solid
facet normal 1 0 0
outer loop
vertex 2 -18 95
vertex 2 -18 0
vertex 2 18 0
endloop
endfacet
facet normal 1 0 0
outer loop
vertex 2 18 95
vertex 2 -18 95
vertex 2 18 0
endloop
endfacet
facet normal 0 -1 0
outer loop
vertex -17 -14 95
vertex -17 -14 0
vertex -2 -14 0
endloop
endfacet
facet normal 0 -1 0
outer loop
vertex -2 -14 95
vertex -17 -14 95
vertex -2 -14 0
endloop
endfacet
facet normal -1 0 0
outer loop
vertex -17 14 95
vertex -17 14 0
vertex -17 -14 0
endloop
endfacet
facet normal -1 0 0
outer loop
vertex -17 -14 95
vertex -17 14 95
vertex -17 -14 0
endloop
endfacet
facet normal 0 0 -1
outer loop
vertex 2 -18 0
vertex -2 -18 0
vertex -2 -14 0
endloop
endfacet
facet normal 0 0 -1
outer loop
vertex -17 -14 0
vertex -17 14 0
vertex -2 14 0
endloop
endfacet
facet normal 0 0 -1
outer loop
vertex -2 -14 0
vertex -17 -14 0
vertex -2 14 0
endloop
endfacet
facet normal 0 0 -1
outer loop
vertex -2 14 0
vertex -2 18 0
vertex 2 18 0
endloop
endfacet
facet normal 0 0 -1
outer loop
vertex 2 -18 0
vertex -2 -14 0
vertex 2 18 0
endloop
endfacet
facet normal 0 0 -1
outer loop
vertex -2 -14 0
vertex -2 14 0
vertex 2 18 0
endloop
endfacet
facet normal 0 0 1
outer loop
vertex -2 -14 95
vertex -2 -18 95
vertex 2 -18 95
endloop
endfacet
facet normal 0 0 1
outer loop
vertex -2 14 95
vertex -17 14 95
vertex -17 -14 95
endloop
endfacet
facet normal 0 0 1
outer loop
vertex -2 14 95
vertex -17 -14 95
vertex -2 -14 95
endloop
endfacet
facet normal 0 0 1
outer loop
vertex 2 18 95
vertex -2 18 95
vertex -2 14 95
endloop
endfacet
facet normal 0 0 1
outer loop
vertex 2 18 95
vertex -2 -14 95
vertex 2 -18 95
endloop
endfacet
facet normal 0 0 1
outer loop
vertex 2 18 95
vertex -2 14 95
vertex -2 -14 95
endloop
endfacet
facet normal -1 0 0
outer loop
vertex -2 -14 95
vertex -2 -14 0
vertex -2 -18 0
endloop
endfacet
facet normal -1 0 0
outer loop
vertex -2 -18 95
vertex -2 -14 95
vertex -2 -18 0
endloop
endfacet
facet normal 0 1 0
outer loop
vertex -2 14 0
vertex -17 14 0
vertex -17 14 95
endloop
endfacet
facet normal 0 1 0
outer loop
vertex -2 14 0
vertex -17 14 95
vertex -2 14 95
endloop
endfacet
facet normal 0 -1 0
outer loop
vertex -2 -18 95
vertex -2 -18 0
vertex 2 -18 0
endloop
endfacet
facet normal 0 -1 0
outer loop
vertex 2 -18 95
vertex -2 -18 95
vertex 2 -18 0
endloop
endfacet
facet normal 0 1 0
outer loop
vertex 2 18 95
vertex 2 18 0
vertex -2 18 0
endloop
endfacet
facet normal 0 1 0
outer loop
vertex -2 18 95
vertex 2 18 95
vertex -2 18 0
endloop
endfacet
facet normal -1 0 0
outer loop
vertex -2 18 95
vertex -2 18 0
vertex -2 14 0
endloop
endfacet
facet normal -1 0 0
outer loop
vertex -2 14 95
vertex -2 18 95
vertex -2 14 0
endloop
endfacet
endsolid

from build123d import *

# Parameters (mm, degrees)
F0_W     = 15
F0_H     = 5
F0_H_2   = 18
F1_DEPTH = 95


with BuildPart() as f1:
    # F0 (on Top) → F1 (new body)
    with BuildSketch(Plane.XY):
        Polygon((2, -18), (2, 18), (-2, 18), (-2, 14), (-2, 9), (-2, -9), (-2, -14), (-2, -18), align=None)
        with Locations((-9.5, 11.5)):
            Rectangle(F0_W, F0_H)
        with Locations((-9.5, 0)):
            Rectangle(F0_W, F0_H_2)
        with Locations((-9.5, -11.5)):
            Rectangle(F0_W, F0_H)
    extrude(amount=F1_DEPTH)


solid = f1.part
